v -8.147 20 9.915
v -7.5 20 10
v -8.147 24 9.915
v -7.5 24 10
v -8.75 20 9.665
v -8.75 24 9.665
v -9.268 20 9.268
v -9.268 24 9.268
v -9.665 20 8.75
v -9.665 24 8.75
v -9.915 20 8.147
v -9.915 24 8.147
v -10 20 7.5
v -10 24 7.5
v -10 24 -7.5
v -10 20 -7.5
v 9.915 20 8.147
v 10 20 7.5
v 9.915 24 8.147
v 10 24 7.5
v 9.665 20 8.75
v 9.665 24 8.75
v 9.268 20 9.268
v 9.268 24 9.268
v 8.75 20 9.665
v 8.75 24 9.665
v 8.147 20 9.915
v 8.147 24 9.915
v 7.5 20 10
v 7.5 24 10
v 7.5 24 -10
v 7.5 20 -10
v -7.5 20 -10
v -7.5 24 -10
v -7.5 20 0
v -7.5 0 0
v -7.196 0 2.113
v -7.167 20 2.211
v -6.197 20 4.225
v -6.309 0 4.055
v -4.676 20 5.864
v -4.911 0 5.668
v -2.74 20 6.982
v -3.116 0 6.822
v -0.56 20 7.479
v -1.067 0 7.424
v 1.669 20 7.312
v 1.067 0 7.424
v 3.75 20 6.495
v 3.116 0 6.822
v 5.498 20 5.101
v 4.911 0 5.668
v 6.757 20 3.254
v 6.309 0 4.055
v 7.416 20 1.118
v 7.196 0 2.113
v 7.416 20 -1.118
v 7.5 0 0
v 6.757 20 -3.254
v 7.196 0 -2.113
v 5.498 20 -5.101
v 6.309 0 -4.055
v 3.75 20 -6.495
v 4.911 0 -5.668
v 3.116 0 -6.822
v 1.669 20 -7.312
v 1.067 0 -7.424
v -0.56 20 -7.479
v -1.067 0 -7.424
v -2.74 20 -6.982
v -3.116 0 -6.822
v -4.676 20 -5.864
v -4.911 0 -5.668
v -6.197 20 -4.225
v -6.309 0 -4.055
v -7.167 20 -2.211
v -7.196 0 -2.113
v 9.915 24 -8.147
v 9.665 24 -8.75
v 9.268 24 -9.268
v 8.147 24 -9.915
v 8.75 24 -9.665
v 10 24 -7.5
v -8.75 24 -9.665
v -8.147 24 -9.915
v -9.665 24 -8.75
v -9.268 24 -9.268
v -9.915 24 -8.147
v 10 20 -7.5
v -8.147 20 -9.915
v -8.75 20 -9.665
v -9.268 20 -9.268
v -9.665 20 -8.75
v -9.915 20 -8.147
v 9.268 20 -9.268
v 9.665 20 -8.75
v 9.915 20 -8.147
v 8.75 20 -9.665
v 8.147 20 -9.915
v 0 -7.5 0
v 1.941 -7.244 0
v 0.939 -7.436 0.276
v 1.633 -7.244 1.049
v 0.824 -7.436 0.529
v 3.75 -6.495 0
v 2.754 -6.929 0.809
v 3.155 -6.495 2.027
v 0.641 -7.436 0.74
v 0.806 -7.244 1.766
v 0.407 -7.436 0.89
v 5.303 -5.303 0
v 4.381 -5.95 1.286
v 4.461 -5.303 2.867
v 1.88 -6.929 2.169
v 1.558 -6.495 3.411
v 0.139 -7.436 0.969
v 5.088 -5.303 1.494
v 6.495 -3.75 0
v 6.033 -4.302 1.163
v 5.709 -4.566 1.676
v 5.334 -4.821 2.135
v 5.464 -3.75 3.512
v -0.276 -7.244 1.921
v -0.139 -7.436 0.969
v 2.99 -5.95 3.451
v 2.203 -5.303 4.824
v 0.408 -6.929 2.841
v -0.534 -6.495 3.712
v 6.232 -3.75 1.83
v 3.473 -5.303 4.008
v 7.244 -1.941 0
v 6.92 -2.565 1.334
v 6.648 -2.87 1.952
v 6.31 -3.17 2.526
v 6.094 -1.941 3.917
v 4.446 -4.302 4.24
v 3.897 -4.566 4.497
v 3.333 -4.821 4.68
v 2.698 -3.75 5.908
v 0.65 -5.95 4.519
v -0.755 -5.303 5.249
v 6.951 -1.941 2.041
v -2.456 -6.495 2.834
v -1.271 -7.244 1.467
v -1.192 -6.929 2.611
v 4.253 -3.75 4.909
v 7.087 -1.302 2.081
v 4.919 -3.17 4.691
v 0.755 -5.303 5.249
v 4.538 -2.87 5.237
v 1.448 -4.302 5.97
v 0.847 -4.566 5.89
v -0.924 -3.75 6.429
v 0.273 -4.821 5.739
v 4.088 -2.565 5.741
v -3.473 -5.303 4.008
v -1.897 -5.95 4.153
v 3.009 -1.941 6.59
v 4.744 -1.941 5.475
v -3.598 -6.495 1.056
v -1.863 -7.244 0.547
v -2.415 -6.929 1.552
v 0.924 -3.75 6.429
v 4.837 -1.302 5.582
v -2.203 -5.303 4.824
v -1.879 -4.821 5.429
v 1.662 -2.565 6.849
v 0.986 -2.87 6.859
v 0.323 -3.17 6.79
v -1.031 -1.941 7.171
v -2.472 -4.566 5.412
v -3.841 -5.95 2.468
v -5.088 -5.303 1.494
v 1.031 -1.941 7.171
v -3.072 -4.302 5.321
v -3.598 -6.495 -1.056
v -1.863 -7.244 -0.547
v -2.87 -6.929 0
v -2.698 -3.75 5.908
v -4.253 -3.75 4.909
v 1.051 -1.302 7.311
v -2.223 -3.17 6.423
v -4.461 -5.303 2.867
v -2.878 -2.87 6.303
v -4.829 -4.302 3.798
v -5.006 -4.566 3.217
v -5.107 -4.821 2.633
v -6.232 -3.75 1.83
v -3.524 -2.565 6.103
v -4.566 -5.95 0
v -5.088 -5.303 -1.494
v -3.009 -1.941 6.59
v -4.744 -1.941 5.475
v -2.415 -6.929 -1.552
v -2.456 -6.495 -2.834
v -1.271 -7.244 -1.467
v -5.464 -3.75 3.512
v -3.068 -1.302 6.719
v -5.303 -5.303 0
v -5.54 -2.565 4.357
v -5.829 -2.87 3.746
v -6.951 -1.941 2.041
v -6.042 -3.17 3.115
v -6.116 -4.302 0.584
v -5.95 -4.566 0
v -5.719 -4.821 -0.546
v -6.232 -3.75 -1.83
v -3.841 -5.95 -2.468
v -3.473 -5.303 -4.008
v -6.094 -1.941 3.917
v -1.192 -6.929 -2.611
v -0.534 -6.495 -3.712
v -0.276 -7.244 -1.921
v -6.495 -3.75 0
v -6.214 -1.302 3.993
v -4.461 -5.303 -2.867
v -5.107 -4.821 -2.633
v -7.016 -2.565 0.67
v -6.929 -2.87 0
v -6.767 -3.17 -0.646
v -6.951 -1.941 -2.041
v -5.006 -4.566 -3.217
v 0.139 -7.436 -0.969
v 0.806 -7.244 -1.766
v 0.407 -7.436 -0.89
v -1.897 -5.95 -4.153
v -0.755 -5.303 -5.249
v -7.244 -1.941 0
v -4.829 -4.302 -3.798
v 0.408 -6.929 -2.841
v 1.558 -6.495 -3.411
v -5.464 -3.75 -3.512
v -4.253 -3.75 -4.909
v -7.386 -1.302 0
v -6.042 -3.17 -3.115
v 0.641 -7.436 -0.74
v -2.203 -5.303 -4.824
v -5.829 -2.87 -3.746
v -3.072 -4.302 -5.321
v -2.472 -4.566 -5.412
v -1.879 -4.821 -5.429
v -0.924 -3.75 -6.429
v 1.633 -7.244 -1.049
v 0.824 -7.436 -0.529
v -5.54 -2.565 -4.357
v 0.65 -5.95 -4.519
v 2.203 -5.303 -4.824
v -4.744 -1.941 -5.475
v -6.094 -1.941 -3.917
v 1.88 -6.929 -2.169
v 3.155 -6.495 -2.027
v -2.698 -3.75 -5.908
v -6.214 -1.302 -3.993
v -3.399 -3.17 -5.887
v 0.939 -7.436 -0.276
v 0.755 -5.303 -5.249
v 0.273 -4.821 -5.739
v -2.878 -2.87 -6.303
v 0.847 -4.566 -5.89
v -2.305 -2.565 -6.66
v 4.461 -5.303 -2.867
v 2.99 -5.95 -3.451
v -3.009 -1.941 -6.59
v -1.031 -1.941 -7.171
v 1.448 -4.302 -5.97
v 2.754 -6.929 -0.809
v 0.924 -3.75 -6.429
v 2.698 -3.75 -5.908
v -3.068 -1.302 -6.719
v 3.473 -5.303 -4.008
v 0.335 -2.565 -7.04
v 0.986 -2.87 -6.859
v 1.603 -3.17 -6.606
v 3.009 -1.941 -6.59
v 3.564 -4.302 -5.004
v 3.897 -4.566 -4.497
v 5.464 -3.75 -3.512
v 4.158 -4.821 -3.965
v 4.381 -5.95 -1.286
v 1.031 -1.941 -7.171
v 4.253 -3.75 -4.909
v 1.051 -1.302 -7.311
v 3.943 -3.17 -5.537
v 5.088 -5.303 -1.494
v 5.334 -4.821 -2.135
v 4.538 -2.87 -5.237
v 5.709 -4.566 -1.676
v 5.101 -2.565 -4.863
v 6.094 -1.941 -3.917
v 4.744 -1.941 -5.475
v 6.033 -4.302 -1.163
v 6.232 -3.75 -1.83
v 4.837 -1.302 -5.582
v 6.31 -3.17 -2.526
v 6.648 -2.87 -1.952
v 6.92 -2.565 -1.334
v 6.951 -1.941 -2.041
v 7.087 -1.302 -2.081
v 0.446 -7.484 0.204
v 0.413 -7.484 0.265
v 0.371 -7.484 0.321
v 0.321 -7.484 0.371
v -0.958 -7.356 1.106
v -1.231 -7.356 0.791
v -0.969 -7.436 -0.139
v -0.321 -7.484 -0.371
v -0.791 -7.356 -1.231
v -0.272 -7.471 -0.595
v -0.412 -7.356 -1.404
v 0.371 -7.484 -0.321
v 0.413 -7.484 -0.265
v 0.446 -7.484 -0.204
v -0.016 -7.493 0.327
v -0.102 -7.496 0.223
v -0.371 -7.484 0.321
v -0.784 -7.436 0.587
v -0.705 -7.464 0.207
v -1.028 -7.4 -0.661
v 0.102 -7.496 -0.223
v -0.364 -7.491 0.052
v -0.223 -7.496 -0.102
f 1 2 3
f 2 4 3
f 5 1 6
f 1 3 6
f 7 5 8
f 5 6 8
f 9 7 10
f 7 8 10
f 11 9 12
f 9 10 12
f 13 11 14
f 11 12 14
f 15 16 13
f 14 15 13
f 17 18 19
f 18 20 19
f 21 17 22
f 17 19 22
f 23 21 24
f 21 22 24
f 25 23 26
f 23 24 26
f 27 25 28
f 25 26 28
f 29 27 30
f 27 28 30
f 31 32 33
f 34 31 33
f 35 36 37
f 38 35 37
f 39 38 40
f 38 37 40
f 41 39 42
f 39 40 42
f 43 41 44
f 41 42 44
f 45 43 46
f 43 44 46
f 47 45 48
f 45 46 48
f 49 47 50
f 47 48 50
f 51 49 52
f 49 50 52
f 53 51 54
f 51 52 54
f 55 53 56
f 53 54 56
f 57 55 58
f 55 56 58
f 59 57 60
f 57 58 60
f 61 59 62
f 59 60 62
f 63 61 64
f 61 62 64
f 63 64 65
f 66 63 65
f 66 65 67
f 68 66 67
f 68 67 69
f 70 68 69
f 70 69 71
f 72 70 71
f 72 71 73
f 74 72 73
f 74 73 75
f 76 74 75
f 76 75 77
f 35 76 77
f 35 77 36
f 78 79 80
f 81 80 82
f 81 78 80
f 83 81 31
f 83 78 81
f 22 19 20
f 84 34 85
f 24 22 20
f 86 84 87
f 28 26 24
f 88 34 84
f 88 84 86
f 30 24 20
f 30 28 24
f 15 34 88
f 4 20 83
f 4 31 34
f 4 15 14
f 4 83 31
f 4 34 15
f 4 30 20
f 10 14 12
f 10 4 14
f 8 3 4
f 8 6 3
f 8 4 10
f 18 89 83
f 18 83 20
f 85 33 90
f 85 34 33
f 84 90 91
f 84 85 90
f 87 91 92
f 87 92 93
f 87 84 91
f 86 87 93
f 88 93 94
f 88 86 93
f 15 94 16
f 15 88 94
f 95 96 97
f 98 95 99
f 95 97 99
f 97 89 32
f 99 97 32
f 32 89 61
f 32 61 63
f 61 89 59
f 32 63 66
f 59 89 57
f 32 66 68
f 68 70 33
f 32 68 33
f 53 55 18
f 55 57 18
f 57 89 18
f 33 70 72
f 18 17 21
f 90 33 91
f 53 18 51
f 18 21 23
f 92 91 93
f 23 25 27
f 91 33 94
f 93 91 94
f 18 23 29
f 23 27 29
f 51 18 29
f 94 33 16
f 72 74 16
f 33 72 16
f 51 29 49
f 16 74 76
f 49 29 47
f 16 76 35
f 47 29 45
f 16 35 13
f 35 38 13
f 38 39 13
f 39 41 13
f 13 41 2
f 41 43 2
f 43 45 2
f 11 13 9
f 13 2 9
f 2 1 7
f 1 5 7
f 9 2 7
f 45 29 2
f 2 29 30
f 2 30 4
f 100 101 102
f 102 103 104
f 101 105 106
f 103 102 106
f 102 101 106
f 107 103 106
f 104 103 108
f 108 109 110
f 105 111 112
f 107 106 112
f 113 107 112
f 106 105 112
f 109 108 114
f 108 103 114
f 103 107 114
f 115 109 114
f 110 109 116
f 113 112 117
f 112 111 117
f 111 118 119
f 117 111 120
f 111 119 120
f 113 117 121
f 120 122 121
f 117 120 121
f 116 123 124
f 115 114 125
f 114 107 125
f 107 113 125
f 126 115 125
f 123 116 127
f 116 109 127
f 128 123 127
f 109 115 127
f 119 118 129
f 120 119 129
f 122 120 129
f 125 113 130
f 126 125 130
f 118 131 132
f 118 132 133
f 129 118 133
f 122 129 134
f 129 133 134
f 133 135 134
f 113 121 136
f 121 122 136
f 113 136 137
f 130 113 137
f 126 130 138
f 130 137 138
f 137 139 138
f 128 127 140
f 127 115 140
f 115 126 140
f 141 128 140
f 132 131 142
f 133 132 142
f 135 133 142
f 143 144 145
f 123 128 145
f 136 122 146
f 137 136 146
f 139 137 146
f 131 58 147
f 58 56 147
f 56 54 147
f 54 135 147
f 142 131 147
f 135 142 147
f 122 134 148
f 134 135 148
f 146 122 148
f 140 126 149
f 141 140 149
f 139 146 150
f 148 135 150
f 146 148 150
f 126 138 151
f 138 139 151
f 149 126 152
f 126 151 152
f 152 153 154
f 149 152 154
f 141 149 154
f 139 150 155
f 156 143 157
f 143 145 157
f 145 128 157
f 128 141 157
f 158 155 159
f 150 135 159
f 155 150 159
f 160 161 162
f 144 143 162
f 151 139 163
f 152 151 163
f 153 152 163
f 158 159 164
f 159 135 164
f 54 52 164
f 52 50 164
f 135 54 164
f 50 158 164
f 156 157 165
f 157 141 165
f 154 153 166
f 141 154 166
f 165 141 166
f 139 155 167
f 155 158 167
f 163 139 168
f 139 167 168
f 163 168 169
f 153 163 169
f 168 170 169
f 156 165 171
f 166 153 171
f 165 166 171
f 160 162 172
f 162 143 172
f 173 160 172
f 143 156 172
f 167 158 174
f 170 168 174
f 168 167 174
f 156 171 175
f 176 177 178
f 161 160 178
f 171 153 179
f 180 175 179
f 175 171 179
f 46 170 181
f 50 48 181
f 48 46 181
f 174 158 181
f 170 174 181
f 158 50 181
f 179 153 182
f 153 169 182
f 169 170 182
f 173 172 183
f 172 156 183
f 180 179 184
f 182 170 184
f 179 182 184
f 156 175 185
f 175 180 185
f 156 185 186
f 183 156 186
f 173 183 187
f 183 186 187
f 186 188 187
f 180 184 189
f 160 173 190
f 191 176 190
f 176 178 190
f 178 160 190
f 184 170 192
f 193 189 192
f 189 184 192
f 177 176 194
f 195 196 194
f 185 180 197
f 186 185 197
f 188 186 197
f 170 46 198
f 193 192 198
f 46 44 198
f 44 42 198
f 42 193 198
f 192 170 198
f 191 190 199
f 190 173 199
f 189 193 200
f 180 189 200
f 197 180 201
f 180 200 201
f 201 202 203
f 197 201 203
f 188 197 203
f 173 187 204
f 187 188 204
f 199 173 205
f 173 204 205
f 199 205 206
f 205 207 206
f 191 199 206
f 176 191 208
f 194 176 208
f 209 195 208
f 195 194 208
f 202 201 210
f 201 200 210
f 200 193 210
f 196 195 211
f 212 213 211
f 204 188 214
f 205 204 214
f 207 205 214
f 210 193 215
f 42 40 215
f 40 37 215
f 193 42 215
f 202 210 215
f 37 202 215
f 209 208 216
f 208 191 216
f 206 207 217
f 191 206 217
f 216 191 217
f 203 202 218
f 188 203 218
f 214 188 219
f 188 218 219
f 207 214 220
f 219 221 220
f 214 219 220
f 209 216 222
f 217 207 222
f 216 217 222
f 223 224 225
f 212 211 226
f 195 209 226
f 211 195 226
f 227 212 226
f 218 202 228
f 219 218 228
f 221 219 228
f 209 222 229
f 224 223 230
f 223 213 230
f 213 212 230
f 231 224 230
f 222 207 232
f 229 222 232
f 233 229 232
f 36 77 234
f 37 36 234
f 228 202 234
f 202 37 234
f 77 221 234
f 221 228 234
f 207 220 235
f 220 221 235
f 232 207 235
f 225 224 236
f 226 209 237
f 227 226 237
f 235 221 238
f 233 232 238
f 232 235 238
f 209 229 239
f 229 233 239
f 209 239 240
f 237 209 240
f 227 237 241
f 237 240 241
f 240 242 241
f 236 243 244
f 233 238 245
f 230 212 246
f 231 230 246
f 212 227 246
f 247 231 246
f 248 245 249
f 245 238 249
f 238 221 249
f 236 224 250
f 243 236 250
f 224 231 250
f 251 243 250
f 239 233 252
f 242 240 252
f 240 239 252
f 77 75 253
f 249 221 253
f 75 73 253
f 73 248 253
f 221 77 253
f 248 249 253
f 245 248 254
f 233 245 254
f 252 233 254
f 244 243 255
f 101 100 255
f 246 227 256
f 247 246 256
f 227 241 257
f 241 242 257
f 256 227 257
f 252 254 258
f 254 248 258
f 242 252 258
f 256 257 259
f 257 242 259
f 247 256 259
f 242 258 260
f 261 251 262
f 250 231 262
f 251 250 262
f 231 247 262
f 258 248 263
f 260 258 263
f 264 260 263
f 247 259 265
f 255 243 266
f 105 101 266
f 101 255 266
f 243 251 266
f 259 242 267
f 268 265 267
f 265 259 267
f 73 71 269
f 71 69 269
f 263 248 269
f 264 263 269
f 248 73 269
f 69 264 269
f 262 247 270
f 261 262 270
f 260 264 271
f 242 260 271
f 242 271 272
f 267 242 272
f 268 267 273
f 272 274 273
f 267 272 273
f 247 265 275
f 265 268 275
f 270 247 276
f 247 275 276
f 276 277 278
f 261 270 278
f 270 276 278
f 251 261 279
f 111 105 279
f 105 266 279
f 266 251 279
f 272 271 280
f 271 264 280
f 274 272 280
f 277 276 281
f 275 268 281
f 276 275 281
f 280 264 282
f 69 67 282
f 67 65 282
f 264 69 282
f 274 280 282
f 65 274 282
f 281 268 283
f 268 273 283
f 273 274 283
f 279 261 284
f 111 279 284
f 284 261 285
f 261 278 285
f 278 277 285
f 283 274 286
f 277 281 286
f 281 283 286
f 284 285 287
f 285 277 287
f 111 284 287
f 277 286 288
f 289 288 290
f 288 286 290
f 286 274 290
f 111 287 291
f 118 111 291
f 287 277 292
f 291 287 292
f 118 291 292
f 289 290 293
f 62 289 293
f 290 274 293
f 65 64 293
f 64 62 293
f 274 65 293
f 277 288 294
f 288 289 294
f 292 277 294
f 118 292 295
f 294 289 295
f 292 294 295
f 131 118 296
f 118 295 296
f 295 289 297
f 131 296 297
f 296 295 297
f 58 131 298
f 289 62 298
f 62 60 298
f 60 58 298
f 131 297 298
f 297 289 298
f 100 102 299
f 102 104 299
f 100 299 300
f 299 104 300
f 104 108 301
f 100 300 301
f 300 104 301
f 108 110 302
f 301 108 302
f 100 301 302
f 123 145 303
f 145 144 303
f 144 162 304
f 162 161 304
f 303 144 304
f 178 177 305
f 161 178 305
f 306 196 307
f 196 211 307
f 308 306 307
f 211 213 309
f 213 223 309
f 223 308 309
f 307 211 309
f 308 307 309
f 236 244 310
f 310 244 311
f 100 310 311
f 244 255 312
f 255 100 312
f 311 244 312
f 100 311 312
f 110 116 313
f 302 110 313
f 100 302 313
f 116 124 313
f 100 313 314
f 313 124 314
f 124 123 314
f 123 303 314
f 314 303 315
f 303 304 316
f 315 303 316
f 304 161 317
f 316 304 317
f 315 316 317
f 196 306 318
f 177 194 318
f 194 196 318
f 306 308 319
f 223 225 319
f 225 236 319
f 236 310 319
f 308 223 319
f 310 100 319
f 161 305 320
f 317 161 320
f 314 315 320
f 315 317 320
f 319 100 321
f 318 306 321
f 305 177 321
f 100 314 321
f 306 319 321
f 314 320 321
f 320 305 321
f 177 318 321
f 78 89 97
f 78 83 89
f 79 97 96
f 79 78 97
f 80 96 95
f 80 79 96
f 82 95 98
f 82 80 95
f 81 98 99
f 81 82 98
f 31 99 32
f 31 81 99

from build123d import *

# Parameters (mm, degrees)
F2_R     = 7.5
F3_DEPTH = 20
F4_W     = 20
F4_H     = 20
F5_DEPTH = 4
F6_R     = 2.5


with BuildPart() as f1:
    # F0 (on Top) → F1 (revolve)
    with BuildSketch(Plane.XY):
        with BuildLine():
            ThreePointArc((0, -7.5), (5.303301, -5.303301), (7.5, 0))
            Line((7.5, 0), (0, 0))
            Line((0, 0), (0, -7.5))
        make_face()
    revolve(axis=Axis((0, -3.75, 0), (0, -1, 0)))

    # F2 (on face) → F3 (join)
    with BuildSketch(Plane(origin=(0, 0, 0), x_dir=(-1, 0, 0), z_dir=(0, 1, 0))):
        Circle(F2_R)
    extrude(amount=F3_DEPTH)

    # F4 (on face) → F5 (join)
    with BuildSketch(Plane(origin=(0, 20, 0), x_dir=(-1, 0, 0), z_dir=(0, 1, 0))):
        Rectangle(F4_W, F4_H)
    extrude(amount=F5_DEPTH)

    # F6
    f6_edges = [f1.edges().sort_by_distance(p)[0] for p in [
        (-10, 22, 10),
        (-10, 22, -10),
        (10, 22, -10),
        (10, 22, 10),
    ]]
    fillet(f6_edges, radius=F6_R)


solid = f1.part
